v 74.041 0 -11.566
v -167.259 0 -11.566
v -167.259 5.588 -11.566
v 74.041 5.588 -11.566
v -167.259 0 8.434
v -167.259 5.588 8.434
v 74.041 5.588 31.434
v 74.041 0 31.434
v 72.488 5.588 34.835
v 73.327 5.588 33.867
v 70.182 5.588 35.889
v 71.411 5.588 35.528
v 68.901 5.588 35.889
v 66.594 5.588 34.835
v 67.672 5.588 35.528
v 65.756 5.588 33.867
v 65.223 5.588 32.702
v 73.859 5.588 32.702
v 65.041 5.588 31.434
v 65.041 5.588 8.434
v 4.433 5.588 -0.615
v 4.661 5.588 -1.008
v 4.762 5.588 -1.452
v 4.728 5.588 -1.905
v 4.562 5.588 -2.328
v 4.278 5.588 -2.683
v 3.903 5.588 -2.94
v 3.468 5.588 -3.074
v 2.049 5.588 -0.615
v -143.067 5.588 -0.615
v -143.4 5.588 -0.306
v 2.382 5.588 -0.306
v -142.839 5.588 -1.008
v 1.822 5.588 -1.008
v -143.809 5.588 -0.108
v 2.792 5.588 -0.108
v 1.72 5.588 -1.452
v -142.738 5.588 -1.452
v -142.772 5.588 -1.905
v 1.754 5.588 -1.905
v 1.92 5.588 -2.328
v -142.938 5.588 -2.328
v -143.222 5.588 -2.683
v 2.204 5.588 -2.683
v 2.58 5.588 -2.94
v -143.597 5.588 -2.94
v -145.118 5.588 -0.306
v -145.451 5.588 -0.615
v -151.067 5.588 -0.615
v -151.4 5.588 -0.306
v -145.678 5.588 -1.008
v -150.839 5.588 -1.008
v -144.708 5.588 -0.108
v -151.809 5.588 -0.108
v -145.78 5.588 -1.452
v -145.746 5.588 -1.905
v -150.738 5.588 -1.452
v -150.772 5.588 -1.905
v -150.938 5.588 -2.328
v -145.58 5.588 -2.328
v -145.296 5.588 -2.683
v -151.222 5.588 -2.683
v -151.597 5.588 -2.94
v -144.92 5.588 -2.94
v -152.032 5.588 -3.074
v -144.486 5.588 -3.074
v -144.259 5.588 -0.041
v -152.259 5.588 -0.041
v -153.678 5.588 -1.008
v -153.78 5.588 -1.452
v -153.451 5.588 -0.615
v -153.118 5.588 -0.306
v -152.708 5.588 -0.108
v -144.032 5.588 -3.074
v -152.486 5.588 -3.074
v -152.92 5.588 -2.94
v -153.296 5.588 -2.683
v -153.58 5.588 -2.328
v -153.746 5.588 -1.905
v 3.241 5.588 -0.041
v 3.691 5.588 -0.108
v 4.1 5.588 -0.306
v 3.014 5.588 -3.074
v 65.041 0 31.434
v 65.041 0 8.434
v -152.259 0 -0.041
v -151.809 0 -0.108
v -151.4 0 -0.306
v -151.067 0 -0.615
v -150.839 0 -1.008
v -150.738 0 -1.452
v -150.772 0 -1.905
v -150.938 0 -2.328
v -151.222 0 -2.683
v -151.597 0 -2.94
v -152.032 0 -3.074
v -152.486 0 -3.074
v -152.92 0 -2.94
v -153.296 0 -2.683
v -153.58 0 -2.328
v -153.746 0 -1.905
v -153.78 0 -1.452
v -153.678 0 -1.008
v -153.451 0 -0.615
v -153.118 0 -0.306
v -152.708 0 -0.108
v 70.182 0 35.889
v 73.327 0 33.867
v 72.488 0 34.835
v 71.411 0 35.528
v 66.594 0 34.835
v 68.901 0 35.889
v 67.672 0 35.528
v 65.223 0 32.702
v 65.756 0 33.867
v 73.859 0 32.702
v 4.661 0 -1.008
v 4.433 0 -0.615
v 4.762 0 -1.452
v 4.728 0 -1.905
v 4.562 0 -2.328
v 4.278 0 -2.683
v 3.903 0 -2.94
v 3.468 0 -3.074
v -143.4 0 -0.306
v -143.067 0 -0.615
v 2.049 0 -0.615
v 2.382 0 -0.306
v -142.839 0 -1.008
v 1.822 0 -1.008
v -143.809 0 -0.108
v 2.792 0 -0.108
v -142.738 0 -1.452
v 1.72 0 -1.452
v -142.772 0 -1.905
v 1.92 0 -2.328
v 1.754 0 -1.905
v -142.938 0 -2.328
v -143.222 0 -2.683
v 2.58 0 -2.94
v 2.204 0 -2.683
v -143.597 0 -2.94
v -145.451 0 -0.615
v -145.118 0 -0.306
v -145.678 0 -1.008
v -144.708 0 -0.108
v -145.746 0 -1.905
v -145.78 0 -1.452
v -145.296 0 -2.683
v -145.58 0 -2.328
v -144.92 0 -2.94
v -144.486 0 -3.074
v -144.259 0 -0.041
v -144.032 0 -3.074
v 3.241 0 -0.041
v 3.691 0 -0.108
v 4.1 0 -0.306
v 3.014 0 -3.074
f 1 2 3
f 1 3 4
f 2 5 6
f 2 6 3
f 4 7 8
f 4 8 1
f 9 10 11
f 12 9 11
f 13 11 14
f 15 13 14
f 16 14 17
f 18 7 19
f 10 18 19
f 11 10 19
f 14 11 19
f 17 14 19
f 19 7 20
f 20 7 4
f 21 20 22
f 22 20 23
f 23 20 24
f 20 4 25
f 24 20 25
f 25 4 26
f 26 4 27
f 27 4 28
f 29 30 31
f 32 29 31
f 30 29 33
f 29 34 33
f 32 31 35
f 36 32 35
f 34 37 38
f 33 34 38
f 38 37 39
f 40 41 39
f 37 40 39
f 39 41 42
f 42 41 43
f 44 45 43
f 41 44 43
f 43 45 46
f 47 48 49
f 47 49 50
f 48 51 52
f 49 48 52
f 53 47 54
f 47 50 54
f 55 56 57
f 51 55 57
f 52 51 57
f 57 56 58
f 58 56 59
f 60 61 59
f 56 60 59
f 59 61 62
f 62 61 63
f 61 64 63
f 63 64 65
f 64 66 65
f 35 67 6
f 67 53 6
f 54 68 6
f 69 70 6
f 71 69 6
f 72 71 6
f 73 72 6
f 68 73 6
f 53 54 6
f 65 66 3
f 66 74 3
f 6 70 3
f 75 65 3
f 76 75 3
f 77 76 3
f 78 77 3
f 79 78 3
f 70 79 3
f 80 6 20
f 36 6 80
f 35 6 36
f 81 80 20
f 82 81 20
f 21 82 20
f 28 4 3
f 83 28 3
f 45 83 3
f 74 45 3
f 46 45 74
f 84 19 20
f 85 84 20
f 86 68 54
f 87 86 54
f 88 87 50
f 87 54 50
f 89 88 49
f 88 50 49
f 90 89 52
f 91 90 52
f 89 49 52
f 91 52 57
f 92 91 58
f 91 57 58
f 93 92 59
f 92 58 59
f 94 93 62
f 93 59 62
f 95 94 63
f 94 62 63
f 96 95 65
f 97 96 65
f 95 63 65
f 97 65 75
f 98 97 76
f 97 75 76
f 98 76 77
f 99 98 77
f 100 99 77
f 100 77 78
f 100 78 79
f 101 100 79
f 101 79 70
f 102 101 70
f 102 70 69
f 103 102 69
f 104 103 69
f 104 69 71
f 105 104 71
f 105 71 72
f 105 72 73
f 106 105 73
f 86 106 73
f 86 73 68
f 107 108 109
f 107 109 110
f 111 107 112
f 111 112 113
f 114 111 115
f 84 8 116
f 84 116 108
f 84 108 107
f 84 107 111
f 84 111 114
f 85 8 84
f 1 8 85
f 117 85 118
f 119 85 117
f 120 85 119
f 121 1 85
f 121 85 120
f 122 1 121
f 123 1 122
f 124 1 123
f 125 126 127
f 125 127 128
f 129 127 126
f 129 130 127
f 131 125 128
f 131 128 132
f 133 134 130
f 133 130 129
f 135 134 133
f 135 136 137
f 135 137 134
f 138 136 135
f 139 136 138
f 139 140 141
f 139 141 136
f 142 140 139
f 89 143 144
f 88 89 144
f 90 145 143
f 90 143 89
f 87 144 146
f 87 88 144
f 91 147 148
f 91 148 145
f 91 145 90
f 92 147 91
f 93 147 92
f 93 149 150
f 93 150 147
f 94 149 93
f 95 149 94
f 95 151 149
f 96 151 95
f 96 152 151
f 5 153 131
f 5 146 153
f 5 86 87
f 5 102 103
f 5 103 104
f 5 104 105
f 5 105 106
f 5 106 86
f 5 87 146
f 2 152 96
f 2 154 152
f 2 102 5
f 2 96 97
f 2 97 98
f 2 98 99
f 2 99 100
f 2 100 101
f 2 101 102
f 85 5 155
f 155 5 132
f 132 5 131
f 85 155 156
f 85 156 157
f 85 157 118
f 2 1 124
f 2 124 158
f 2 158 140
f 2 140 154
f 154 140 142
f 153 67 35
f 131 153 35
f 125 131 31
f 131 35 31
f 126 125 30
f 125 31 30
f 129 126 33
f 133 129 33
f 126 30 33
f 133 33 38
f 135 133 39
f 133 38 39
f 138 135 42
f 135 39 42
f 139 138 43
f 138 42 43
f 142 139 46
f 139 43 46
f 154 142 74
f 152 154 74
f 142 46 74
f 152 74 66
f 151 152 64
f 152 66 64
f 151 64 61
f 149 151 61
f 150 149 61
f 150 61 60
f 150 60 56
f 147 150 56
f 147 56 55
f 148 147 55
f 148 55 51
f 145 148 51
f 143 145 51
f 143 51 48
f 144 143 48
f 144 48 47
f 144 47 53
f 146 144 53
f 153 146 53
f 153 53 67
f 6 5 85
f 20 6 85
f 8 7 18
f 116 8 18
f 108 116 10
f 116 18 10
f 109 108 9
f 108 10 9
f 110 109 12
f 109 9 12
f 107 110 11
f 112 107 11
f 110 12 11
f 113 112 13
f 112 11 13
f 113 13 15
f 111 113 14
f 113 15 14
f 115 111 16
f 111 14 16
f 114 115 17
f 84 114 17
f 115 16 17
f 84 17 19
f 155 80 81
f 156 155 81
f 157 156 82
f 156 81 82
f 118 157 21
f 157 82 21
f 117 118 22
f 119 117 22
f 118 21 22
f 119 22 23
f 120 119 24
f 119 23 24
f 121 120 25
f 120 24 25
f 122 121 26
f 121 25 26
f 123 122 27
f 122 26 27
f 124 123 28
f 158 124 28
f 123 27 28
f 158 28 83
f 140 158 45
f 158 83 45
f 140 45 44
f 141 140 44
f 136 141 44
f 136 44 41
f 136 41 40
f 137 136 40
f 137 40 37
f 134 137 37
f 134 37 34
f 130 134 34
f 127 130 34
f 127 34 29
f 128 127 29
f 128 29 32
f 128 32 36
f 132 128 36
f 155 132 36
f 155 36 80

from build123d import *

# Parameters (mm, degrees)
SKETCH1_W           = 241.3
SKETCH1_H           = 20
BOSS_EXTRUDE1_DEPTH = 5.588
CUT_EXTRUDE1_REACH  = 169.751
SKETCH2_R           = 1.525
SKETCH3_W           = 9
SKETCH3_H           = 23
BOSS_EXTRUDE2_DEPTH = 5.588
BOSS_EXTRUDE3_DEPTH = 5.588


with BuildPart() as part:
    # Sketch1 → Boss-Extrude1 (new body)
    with BuildSketch(Plane(origin=(0, 0, 0), x_dir=(1, 0, 0), z_dir=(0, 1, 0))):
        with Locations((-46.608825085, 1.565543133)):
            Rectangle(SKETCH1_W, SKETCH1_H)
    extrude(amount=BOSS_EXTRUDE1_DEPTH)

    # Sketch2 → Cut-Extrude1 (cut, up to next)
    with BuildSketch(Plane(origin=(0, 5.588, 0), x_dir=(1, 0, 0), z_dir=(0, 1, 0)), mode=Mode.PRIVATE) as cut_extrude1_sk1:
        with Locations(Location((3.241174915, 1.565543133, 0), (0, 0, 270))):
            Circle(SKETCH2_R)
    cut_extrude1_tool1 = extrude(cut_extrude1_sk1.sketch, amount=-CUT_EXTRUDE1_REACH, mode=Mode.PRIVATE) & part.part
    # Sketch2 → Cut-Extrude1 (cut, up to next)
    with BuildSketch(Plane(origin=(0, 5.588, 0), x_dir=(1, 0, 0), z_dir=(0, 1, 0)), mode=Mode.PRIVATE) as cut_extrude1_sk2:
        with Locations(Location((-152.258825085, 1.565543133, 0), (0, 0, 270))):
            Circle(SKETCH2_R)
    cut_extrude1_tool2 = extrude(cut_extrude1_sk2.sketch, amount=-CUT_EXTRUDE1_REACH, mode=Mode.PRIVATE) & part.part
    # Sketch2 → Cut-Extrude1 (cut, up to next)
    with BuildSketch(Plane(origin=(0, 5.588, 0), x_dir=(1, 0, 0), z_dir=(0, 1, 0)), mode=Mode.PRIVATE) as cut_extrude1_sk3:
        with Locations(Location((-144.258825085, 1.565543133, 0), (0, 0, 270))):
            Circle(SKETCH2_R)
    cut_extrude1_tool3 = extrude(cut_extrude1_sk3.sketch, amount=-CUT_EXTRUDE1_REACH, mode=Mode.PRIVATE) & part.part
    add(cut_extrude1_tool1.solids().sort_by_distance((3.241175, 5.588, -1.565543))[0], mode=Mode.SUBTRACT)
    add(cut_extrude1_tool2.solids().sort_by_distance((-152.258825, 5.588, -1.565543))[0], mode=Mode.SUBTRACT)
    add(cut_extrude1_tool3.solids().sort_by_distance((-144.258825, 5.588, -1.565543))[0], mode=Mode.SUBTRACT)

    # Sketch3 → Boss-Extrude2 (add)
    with BuildSketch(Plane(origin=(0, 5.588, 0), x_dir=(1, 0, 0), z_dir=(0, 1, 0))):
        with Locations((69.541174915, -19.934456867)):
            Rectangle(SKETCH3_W, SKETCH3_H)
    extrude(amount=-BOSS_EXTRUDE2_DEPTH)

    # Sketch4 → Boss-Extrude3 (add)
    with BuildSketch(Plane(origin=(0, 5.588, 0), x_dir=(1, 0, 0), z_dir=(0, 1, 0))):
        with BuildLine():
            Line((65.041174915, -31.434456867), (74.041174915, -31.434456867))
            ThreePointArc((74.041174915, -31.434456867), (69.541174915, -35.934456867), (65.041174915, -31.434456867))
        make_face()
    extrude(amount=-BOSS_EXTRUDE3_DEPTH)


solid = part.part
